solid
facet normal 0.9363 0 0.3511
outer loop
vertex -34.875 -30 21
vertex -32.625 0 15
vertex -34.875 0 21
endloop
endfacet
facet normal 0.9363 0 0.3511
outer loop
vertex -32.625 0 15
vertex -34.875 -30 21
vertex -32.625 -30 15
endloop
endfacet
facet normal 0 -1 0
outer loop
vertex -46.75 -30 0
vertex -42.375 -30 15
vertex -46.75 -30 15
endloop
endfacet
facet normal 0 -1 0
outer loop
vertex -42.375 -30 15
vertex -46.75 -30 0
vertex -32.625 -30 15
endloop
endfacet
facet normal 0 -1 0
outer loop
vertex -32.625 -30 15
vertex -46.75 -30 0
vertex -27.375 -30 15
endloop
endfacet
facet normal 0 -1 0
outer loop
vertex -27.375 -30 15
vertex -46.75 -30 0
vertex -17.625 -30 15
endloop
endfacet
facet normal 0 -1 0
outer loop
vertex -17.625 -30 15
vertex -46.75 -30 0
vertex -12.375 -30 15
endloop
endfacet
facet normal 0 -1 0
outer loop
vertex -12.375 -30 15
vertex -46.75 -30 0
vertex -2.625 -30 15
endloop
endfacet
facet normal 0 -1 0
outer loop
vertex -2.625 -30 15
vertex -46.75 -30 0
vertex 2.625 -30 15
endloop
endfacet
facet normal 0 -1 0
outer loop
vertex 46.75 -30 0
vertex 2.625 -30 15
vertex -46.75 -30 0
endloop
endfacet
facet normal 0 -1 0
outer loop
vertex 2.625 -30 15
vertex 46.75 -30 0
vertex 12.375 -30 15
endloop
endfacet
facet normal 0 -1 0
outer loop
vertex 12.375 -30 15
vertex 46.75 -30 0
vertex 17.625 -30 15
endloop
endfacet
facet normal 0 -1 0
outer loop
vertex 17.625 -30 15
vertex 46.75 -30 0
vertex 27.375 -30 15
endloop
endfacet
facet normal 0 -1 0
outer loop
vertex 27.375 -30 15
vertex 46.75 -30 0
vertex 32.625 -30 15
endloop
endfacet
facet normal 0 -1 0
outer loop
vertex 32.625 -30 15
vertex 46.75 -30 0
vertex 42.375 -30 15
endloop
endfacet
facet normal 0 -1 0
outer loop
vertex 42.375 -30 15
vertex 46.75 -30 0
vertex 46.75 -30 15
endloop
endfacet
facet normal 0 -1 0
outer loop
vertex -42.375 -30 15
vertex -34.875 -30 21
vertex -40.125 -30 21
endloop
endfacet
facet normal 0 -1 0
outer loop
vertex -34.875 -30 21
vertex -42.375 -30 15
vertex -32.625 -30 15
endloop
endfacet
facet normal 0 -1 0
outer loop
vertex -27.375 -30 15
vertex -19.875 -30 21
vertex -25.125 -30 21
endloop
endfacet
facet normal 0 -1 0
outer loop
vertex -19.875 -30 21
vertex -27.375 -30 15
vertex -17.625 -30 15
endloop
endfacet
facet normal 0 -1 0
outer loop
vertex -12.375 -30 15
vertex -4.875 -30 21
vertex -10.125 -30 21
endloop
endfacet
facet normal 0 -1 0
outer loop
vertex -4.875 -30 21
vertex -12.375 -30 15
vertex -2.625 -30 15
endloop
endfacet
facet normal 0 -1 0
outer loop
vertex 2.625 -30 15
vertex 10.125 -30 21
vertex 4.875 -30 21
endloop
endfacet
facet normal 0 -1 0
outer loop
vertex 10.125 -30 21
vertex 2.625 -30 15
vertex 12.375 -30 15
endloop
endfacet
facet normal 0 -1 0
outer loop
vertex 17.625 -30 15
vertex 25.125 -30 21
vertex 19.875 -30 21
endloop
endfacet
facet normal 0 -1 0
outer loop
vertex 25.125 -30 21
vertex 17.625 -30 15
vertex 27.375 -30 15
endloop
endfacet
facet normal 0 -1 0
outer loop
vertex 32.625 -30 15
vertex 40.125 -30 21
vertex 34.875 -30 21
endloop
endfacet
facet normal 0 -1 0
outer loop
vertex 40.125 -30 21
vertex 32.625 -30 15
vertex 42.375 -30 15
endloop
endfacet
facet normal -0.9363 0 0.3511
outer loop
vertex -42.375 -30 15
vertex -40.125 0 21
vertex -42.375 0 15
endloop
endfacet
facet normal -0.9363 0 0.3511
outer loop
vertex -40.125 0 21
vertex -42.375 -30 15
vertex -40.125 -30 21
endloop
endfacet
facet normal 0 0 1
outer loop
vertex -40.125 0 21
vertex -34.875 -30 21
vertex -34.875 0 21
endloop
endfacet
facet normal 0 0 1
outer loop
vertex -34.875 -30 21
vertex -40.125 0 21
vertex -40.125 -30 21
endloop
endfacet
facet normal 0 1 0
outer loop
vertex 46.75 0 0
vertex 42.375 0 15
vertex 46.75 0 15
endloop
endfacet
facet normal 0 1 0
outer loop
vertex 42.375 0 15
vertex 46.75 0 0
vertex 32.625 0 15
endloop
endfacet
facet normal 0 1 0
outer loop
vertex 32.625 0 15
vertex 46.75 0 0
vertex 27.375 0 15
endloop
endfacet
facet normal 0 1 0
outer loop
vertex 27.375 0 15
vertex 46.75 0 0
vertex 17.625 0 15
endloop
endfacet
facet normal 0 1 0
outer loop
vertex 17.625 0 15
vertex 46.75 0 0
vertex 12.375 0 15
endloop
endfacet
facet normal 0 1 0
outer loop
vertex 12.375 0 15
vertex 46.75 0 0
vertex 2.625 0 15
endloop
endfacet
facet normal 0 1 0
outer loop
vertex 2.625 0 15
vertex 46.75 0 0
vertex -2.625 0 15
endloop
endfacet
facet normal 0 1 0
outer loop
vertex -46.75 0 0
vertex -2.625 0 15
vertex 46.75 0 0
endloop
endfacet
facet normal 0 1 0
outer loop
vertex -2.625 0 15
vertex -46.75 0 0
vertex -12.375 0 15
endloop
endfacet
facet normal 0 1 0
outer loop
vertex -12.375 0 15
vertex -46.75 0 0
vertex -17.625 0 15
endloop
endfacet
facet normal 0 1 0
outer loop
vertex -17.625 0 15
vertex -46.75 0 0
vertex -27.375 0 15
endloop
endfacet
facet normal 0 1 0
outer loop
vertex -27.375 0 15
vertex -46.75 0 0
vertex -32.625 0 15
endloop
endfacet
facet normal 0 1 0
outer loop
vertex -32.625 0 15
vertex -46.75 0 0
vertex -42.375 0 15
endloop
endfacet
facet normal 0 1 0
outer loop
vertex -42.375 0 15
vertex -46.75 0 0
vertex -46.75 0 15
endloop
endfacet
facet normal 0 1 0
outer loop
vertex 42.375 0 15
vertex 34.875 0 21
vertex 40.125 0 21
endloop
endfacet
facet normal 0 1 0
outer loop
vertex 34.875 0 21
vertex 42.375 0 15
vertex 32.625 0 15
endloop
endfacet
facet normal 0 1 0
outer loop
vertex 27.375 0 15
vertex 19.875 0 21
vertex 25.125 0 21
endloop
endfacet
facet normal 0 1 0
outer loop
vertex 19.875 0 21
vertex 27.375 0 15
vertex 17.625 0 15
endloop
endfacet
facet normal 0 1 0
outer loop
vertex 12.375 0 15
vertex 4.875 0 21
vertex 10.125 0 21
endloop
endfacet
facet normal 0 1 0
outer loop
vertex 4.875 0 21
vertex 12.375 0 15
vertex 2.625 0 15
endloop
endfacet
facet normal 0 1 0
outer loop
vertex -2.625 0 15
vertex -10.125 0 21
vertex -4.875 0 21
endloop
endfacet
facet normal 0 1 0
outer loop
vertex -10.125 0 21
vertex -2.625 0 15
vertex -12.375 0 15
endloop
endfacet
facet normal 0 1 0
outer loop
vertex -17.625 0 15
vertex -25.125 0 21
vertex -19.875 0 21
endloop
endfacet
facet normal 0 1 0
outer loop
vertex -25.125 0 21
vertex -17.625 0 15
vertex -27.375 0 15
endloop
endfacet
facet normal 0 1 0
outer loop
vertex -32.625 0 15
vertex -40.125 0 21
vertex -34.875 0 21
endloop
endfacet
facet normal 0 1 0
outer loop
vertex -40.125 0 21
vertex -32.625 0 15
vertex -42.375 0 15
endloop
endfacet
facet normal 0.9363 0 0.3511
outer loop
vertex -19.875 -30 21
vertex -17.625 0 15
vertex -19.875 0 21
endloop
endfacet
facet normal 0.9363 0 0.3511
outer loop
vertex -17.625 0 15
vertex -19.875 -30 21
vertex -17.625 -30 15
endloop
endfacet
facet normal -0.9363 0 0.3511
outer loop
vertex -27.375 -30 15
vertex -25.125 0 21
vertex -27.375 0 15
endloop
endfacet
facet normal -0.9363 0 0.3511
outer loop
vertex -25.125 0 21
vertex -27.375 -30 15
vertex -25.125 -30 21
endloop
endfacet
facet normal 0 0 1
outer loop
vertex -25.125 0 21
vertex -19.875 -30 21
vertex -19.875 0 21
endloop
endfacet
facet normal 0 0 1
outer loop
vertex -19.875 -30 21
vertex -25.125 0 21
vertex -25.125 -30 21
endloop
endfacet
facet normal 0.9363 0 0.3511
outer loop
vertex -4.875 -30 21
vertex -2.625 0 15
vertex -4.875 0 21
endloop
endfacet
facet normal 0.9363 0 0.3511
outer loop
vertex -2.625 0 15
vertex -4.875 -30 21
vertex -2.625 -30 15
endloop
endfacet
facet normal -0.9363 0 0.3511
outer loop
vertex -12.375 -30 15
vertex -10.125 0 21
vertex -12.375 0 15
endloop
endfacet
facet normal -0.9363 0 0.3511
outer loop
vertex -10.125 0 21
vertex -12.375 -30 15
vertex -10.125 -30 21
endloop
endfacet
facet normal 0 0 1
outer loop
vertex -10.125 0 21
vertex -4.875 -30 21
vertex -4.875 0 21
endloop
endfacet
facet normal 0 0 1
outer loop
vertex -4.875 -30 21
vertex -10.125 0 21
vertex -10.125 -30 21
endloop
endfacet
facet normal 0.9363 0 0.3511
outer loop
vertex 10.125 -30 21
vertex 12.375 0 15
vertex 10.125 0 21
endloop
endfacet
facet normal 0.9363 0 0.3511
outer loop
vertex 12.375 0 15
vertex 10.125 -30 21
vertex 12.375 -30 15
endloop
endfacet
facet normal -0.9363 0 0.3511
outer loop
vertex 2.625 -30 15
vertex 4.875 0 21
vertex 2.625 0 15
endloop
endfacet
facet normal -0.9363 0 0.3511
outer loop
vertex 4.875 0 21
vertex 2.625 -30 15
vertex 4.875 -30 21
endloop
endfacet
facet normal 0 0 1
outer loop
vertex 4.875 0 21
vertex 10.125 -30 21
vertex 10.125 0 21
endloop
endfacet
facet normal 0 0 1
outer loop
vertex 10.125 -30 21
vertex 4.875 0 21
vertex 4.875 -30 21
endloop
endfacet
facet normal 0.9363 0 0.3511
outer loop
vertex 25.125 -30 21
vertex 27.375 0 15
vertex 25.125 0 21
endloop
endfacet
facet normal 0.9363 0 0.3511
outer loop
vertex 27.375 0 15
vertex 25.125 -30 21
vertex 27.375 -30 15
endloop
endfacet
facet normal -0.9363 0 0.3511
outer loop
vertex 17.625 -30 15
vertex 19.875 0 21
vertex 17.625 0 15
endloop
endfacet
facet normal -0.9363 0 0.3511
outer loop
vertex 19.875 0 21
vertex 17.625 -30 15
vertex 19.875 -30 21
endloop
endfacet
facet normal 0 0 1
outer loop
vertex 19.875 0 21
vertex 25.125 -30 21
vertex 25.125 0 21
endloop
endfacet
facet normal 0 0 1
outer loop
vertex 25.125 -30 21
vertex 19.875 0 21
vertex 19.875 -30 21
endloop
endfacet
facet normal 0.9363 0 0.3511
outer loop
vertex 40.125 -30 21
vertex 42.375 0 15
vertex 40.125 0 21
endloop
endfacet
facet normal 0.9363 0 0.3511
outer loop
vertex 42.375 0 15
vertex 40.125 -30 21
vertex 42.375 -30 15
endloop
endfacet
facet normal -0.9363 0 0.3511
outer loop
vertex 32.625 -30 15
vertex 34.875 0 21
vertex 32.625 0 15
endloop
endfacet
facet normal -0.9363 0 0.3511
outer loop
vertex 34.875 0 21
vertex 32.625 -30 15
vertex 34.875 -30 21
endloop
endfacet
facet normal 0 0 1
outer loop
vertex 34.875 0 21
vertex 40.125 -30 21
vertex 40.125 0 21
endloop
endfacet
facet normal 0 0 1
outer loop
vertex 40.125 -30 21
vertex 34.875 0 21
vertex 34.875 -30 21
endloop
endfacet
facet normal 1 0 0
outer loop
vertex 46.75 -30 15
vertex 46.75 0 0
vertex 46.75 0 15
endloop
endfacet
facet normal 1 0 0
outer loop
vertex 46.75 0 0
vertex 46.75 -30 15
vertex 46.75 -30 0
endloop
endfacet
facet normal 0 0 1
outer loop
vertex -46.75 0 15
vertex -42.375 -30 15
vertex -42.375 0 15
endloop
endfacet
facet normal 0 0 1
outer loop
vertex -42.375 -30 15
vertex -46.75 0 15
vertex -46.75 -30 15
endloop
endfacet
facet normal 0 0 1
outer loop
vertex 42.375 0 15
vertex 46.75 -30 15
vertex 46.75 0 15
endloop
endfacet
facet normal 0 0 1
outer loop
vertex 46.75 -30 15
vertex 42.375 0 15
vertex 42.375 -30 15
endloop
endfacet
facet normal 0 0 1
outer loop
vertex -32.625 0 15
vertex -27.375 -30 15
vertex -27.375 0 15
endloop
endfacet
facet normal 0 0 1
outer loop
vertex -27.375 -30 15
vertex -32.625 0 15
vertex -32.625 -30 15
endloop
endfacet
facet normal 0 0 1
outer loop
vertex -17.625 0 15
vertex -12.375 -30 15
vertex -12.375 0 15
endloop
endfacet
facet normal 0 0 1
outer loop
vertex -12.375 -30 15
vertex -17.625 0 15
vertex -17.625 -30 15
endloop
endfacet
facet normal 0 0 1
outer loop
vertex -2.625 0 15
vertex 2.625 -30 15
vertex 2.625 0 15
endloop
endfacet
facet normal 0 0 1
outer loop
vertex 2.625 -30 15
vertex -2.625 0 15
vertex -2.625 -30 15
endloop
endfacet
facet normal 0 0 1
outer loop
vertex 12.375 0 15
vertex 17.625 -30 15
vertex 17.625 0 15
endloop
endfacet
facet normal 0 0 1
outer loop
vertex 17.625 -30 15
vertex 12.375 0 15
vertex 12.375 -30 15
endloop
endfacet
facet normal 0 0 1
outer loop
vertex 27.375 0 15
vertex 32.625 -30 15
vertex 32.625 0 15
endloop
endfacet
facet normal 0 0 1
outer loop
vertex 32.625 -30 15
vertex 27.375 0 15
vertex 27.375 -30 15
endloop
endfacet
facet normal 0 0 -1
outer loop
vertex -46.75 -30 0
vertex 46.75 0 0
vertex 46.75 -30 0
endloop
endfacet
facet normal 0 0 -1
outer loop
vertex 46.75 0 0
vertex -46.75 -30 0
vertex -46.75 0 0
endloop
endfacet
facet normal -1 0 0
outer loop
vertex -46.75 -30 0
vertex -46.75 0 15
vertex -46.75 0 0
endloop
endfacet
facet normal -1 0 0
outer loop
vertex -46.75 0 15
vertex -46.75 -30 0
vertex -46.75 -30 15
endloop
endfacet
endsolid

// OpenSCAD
$fn = 32;

// ----------------------------------------------------------------------
// Toothed rack, 6 teeth
// 15 mm pitch, 6 mm teeth
// ----------------------------------------------------------------------

// --- parameters (mm) ---
bar_w = 30;      // bar width (Y)
bar_h = 15;      // bar height (Z)
teeth = 6;       // number of teeth
pitch = 15;      // tooth pitch
tooth_h = 6;     // tooth height above the bar
root_w = 10.5;   // tooth width at the root
crest_w = 5.25;  // tooth width at the crest

// --- derived feature positions (mm) ---
span = (teeth - 1) * pitch;  // = 75   distance between the outer teeth
bar_l = span + root_w + 8;   // = 93.5   bar length: teeth plus 4 mm at each end
tooth_x = -span / 2;         // = -37.5   X of the first tooth
height = bar_h + tooth_h;    // = 21   overall height
feature_centers = [
  [tooth_x + 0 * pitch, -bar_w / 2],
  [tooth_x + 1 * pitch, -bar_w / 2],
  [tooth_x + 2 * pitch, -bar_w / 2],
  [tooth_x + 3 * pitch, -bar_w / 2],
  [tooth_x + 4 * pitch, -bar_w / 2],
  [tooth_x + 5 * pitch, -bar_w / 2]
];   // tooth centre line, drives the tooth loop

// bar with a rack of teeth, one extruded trapezoium per centre
module rack_tooth() {
  linear_extrude(height = bar_w)
    polygon(points = [
      [0, 0],
      [root_w, 0],
      [root_w / 2 + crest_w / 2, tooth_h + 1],
      [root_w / 2 - crest_w / 2, tooth_h + 1]
    ]);
}

union() {
  translate([-bar_l / 2, -bar_w, 0]) cube([bar_l, bar_w, bar_h]);
  for (centre = feature_centers)
    translate([centre[0] - root_w / 2, 0, bar_h - 1]) rotate([90, 0, 0]) rack_tooth();
}
